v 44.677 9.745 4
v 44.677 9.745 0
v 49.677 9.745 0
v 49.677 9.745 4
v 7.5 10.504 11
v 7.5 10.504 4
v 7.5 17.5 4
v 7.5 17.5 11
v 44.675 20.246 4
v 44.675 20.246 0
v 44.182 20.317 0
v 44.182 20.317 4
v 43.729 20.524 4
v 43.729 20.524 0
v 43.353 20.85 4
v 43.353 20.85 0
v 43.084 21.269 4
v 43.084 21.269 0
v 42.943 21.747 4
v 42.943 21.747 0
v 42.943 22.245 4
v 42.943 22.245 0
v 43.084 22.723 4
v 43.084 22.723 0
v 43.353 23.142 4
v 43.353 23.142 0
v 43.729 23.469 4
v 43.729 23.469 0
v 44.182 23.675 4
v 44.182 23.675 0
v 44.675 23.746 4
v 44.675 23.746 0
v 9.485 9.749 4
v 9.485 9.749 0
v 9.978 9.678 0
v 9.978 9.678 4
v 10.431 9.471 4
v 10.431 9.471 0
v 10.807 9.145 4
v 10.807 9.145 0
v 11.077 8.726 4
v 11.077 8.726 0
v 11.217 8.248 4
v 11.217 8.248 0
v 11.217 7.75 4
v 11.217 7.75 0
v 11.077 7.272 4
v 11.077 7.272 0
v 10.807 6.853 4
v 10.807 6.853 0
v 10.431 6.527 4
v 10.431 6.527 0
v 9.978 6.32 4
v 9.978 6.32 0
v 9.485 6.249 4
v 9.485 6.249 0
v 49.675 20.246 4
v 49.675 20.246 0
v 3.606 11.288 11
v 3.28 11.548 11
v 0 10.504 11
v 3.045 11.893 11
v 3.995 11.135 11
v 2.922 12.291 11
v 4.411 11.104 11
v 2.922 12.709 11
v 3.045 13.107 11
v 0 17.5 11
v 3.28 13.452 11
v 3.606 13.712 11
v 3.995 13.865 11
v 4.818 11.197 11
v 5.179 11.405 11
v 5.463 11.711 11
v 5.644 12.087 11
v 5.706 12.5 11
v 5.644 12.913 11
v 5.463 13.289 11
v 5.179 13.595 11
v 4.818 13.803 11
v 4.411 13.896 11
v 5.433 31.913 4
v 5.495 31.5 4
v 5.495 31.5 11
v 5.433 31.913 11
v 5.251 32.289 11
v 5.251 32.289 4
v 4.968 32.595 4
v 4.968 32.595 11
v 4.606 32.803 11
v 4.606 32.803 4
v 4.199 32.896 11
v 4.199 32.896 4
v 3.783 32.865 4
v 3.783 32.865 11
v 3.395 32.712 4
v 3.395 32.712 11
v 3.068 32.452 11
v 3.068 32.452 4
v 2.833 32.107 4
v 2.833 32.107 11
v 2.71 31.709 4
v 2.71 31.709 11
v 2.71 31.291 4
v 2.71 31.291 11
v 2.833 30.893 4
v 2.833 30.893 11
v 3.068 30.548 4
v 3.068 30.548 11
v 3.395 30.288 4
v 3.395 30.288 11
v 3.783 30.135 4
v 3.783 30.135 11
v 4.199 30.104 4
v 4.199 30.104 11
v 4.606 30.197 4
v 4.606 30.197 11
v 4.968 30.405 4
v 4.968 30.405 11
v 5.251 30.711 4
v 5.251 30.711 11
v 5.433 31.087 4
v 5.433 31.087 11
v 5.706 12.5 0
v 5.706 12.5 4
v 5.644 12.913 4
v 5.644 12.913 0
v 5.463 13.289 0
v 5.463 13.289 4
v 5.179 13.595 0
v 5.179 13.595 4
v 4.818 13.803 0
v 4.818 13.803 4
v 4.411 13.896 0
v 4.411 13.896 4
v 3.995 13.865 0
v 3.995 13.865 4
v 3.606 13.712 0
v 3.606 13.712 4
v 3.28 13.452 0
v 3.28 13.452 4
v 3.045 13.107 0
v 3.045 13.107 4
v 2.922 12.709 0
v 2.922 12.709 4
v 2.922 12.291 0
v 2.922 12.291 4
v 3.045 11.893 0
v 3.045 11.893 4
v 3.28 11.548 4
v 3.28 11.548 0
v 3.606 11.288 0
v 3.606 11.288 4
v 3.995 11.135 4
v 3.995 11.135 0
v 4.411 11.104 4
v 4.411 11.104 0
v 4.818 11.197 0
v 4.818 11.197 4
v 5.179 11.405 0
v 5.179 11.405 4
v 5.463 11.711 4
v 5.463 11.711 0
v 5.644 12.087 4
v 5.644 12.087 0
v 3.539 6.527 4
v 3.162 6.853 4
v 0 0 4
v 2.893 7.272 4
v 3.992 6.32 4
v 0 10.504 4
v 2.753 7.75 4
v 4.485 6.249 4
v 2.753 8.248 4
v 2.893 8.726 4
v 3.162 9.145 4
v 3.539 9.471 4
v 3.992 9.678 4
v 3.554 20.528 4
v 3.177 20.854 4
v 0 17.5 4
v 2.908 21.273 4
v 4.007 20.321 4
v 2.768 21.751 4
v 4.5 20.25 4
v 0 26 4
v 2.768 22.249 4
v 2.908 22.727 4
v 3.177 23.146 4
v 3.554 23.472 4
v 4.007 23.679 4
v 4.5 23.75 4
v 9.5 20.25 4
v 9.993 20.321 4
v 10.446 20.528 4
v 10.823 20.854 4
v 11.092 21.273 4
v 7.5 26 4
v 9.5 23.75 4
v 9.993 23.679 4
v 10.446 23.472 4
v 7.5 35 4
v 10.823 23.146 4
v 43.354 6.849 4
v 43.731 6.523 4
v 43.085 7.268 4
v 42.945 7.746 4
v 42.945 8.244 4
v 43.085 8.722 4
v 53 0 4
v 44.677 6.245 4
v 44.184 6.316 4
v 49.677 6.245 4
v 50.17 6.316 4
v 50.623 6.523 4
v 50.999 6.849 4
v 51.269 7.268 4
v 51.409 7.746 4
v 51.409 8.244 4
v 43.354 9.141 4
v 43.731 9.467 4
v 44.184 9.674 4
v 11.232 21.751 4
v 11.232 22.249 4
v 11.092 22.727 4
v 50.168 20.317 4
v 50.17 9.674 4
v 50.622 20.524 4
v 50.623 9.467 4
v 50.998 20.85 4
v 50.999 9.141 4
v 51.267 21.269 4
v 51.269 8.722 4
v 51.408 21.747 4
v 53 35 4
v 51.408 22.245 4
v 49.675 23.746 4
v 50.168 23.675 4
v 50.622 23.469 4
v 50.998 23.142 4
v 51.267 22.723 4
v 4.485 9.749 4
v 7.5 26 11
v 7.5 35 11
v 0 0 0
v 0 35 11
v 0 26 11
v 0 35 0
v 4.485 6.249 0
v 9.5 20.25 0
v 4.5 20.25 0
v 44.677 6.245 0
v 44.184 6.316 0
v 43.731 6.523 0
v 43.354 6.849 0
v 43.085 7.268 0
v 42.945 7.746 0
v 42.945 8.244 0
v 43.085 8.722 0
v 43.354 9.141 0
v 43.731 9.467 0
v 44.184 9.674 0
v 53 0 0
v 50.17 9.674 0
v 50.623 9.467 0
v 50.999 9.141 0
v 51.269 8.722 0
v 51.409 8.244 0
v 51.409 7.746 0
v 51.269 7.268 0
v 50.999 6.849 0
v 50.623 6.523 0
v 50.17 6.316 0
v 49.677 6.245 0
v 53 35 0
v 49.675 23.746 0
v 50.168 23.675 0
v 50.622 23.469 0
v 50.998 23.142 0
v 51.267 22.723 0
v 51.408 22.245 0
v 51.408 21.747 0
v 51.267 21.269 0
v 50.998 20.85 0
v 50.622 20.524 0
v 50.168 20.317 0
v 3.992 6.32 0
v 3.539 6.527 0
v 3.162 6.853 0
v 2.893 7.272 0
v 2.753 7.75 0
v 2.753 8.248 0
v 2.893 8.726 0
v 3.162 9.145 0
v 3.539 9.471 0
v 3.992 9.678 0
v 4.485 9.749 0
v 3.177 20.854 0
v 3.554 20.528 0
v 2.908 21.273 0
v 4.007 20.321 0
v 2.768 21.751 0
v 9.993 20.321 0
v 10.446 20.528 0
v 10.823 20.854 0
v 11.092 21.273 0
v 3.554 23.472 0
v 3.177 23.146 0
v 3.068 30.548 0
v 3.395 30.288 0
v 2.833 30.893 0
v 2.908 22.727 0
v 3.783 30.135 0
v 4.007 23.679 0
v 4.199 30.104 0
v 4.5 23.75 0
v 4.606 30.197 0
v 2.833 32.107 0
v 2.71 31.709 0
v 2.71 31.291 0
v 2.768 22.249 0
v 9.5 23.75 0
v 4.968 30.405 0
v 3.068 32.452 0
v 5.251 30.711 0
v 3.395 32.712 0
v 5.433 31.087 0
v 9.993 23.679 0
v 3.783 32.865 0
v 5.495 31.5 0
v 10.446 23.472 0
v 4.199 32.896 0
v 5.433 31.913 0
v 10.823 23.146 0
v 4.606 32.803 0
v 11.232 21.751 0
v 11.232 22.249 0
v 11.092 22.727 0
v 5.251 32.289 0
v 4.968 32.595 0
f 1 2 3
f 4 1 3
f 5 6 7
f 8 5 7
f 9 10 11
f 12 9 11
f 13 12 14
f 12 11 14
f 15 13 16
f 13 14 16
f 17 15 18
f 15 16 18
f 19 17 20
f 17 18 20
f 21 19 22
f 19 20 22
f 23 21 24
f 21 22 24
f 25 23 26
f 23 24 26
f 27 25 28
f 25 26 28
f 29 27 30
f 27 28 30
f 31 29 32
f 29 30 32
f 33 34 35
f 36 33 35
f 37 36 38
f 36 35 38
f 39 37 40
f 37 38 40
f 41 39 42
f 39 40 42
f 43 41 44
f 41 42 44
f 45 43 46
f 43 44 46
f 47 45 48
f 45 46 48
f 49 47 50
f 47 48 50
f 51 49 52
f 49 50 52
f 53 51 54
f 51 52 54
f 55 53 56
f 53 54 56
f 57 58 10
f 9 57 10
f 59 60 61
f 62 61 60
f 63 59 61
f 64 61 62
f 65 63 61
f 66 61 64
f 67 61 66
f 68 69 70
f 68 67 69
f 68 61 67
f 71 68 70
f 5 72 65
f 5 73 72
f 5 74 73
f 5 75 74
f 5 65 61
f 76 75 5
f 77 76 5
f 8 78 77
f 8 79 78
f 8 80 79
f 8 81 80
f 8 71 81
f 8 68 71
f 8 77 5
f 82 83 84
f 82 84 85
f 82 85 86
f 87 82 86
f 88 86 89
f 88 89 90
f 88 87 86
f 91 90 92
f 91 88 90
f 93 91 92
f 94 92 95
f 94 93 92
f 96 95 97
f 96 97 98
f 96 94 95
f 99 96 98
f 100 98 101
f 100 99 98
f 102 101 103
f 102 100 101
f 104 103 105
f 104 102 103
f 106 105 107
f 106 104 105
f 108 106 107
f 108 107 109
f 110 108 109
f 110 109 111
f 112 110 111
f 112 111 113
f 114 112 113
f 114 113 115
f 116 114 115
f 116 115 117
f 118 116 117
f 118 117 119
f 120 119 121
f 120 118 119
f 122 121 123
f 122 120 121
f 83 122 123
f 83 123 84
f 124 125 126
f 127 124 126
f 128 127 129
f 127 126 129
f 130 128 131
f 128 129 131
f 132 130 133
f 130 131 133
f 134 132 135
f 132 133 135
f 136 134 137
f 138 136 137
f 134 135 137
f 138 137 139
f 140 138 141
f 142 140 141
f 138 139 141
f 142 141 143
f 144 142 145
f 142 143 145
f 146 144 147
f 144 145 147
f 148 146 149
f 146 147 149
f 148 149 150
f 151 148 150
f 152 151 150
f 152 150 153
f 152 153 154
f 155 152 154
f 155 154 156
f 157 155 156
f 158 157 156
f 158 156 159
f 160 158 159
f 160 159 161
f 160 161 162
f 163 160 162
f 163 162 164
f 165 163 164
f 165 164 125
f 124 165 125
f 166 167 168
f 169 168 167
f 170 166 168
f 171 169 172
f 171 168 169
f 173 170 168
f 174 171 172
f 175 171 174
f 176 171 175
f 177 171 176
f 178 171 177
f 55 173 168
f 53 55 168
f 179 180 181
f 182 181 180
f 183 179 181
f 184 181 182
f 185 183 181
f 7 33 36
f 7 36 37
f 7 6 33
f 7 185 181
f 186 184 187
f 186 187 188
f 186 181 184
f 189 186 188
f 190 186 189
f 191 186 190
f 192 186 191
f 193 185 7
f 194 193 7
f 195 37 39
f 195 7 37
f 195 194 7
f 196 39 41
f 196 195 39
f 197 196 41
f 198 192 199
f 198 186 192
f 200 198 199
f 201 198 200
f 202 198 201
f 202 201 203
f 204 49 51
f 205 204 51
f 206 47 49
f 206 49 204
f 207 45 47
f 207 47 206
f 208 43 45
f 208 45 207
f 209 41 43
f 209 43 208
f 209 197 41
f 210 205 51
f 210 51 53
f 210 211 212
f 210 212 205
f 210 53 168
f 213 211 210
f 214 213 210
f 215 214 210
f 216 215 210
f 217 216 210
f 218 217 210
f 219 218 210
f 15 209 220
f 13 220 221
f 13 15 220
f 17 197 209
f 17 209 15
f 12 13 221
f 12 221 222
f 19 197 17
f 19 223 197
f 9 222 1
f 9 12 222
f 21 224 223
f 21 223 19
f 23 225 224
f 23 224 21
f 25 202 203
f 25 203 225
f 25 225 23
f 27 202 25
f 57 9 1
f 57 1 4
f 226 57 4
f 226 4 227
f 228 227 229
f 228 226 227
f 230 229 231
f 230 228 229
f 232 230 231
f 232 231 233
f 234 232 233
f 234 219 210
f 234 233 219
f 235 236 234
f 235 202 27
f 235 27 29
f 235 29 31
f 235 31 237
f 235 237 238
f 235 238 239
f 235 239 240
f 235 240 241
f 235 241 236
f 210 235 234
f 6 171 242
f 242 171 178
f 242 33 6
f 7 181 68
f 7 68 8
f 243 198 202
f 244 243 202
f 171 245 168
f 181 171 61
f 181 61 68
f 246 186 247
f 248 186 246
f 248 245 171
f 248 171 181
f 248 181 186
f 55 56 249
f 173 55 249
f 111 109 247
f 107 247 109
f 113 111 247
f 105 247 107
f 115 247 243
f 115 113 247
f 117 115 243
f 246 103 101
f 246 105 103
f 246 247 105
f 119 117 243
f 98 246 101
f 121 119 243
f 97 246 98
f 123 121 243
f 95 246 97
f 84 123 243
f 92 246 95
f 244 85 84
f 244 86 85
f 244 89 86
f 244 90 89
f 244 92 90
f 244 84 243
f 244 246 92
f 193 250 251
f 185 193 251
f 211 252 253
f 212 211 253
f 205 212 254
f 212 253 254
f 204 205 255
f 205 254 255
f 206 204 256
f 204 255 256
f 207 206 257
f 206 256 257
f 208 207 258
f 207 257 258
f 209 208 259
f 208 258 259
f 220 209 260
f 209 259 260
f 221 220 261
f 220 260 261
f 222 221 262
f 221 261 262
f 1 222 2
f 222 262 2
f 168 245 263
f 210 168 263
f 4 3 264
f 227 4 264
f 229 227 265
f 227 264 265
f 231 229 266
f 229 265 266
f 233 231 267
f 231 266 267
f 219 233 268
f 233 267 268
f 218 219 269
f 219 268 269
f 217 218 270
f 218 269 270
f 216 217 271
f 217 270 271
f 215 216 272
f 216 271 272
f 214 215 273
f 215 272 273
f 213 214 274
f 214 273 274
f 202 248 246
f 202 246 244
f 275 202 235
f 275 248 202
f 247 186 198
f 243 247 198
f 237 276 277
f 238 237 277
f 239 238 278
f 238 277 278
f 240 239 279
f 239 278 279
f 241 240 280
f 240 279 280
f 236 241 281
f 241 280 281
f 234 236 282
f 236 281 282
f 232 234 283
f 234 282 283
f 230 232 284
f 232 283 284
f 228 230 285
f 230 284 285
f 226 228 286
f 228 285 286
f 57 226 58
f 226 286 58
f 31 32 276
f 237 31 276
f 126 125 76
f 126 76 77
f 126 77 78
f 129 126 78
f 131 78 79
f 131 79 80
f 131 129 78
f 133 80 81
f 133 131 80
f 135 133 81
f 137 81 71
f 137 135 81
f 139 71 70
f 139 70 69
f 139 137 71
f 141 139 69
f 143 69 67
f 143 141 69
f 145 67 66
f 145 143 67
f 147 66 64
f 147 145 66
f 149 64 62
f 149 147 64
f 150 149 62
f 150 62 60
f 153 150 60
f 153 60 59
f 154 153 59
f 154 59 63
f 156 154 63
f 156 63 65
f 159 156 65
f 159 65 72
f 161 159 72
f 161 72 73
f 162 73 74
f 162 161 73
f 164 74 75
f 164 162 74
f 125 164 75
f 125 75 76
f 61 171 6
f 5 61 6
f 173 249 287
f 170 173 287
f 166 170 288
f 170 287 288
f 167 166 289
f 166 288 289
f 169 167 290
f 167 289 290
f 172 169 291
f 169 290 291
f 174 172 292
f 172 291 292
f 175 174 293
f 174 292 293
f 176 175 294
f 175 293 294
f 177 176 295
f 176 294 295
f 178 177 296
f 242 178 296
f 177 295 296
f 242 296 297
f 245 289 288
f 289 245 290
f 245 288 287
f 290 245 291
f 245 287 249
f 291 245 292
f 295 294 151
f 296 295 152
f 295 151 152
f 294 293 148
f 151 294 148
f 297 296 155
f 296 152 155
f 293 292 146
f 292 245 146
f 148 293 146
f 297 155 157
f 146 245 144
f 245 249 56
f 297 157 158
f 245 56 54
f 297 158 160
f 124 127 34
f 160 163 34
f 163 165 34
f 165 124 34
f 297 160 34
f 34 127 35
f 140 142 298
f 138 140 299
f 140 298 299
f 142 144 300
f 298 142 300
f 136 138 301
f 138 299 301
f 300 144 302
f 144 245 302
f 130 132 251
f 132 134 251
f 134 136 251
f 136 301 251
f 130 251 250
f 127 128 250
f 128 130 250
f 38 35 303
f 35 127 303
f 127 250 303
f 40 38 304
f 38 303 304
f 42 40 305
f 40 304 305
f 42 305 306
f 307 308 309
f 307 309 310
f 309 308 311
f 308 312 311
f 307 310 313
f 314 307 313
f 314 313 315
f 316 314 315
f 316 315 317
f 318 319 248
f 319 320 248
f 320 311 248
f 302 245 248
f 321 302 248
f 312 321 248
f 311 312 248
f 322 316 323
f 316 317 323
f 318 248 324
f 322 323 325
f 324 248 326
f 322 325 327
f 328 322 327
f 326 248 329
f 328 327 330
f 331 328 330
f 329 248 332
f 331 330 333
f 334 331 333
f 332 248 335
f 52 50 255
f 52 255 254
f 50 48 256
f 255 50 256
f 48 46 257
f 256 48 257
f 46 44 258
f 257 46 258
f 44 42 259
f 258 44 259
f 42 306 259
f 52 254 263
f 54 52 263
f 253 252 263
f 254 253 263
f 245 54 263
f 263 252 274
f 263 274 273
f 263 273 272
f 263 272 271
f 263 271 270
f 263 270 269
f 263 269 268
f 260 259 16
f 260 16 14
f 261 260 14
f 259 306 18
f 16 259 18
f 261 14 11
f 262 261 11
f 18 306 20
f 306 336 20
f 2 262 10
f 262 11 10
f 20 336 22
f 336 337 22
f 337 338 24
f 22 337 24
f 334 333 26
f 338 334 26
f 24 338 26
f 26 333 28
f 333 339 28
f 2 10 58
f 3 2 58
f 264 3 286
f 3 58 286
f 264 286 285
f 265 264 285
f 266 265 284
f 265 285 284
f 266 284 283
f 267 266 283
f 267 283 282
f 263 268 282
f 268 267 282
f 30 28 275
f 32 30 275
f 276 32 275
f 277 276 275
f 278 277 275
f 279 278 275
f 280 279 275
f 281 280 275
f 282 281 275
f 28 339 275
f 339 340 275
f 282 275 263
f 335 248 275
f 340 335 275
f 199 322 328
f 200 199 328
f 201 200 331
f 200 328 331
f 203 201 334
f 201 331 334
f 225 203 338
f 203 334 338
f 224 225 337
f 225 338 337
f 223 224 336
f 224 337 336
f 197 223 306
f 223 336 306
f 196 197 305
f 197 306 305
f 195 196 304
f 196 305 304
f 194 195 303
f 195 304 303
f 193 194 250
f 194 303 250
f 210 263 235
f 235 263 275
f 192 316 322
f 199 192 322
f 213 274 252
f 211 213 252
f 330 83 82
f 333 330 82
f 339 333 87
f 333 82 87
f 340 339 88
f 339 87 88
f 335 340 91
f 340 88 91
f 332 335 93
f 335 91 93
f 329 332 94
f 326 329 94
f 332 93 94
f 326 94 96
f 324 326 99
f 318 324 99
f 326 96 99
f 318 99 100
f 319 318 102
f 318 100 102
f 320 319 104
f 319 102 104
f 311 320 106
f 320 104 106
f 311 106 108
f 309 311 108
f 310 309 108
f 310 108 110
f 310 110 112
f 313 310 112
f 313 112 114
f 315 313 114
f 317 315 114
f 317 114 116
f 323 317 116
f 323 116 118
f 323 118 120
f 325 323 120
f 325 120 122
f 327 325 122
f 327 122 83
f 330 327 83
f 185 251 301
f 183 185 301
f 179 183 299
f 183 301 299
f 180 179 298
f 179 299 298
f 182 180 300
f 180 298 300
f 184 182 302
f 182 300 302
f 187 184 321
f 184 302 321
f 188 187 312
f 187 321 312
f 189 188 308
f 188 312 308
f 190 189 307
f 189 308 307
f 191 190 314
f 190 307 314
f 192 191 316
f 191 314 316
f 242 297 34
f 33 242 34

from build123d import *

# Parameters (mm, degrees)
F0_W     = 53
F0_H     = 35
F1_DEPTH = 4
F2_R     = 1.4
F3_DEPTH = 25
F4_W     = 7.5
F4_H     = 6.995946
F4_R     = 1.4
F4_H_2   = 9
F5_DEPTH = 7


with BuildPart() as f1:
    # F0 (on Top) → F1 (new body)
    with BuildSketch(Plane.XY):
        with Locations((26.5, 17.5)):
            Rectangle(F0_W, F0_H)
        with BuildLine():
            ThreePointArc((4.484879, 6.248995), (2.734879, 7.998995), (4.484879, 9.748995))
            Line((4.484879, 9.748995), (9.484879, 9.748995))
            ThreePointArc((9.484879, 9.748995), (11.234879, 7.998995), (9.484879, 6.248995))
            Line((9.484879, 6.248995), (4.484879, 6.248995))
        make_face(mode=Mode.SUBTRACT)
        with BuildLine():
            ThreePointArc((44.676833, 6.244954), (42.926833, 7.994954), (44.676833, 9.744954))
            Line((44.676833, 9.744954), (49.676833, 9.744954))
            ThreePointArc((49.676833, 9.744954), (51.426833, 7.994954), (49.676833, 6.244954))
            Line((49.676833, 6.244954), (44.676833, 6.244954))
        make_face(mode=Mode.SUBTRACT)
        with BuildLine():
            ThreePointArc((4.5, 20.25), (2.75, 22), (4.5, 23.75))
            Line((4.5, 23.75), (9.5, 23.75))
            ThreePointArc((9.5, 23.75), (11.25, 22), (9.5, 20.25))
            Line((9.5, 20.25), (4.5, 20.25))
        make_face(mode=Mode.SUBTRACT)
        with BuildLine():
            ThreePointArc((44.675402, 20.246368), (42.925402, 21.996368), (44.675402, 23.746368))
            Line((44.675402, 23.746368), (49.675402, 23.746368))
            ThreePointArc((49.675402, 23.746368), (51.425402, 21.996368), (49.675402, 20.246368))
            Line((49.675402, 20.246368), (44.675402, 20.246368))
        make_face(mode=Mode.SUBTRACT)
    extrude(amount=F1_DEPTH)

    # F2 (on face) → F3 (cut)
    with BuildSketch(Plane.XY.offset(4)):
        with Locations((4.094722, 31.5)):
            Circle(F2_R)
        with Locations((4.306453, 12.5)):
            Circle(F2_R)
    extrude(amount=-F3_DEPTH, mode=Mode.SUBTRACT)

    # F4 (on face) → F5 (join)
    with BuildSketch(Plane.XY.offset(4)):
        with Locations((3.75, 14.002027)):
            Rectangle(F4_W, F4_H)
        with Locations((4.306453, 12.5)):
            Circle(F4_R, mode=Mode.SUBTRACT)
        with Locations((3.75, 30.5)):
            Rectangle(F4_W, F4_H_2)
        with Locations((4.094722, 31.5)):
            Circle(F4_R, mode=Mode.SUBTRACT)
    extrude(amount=F5_DEPTH)


solid = f1.part
